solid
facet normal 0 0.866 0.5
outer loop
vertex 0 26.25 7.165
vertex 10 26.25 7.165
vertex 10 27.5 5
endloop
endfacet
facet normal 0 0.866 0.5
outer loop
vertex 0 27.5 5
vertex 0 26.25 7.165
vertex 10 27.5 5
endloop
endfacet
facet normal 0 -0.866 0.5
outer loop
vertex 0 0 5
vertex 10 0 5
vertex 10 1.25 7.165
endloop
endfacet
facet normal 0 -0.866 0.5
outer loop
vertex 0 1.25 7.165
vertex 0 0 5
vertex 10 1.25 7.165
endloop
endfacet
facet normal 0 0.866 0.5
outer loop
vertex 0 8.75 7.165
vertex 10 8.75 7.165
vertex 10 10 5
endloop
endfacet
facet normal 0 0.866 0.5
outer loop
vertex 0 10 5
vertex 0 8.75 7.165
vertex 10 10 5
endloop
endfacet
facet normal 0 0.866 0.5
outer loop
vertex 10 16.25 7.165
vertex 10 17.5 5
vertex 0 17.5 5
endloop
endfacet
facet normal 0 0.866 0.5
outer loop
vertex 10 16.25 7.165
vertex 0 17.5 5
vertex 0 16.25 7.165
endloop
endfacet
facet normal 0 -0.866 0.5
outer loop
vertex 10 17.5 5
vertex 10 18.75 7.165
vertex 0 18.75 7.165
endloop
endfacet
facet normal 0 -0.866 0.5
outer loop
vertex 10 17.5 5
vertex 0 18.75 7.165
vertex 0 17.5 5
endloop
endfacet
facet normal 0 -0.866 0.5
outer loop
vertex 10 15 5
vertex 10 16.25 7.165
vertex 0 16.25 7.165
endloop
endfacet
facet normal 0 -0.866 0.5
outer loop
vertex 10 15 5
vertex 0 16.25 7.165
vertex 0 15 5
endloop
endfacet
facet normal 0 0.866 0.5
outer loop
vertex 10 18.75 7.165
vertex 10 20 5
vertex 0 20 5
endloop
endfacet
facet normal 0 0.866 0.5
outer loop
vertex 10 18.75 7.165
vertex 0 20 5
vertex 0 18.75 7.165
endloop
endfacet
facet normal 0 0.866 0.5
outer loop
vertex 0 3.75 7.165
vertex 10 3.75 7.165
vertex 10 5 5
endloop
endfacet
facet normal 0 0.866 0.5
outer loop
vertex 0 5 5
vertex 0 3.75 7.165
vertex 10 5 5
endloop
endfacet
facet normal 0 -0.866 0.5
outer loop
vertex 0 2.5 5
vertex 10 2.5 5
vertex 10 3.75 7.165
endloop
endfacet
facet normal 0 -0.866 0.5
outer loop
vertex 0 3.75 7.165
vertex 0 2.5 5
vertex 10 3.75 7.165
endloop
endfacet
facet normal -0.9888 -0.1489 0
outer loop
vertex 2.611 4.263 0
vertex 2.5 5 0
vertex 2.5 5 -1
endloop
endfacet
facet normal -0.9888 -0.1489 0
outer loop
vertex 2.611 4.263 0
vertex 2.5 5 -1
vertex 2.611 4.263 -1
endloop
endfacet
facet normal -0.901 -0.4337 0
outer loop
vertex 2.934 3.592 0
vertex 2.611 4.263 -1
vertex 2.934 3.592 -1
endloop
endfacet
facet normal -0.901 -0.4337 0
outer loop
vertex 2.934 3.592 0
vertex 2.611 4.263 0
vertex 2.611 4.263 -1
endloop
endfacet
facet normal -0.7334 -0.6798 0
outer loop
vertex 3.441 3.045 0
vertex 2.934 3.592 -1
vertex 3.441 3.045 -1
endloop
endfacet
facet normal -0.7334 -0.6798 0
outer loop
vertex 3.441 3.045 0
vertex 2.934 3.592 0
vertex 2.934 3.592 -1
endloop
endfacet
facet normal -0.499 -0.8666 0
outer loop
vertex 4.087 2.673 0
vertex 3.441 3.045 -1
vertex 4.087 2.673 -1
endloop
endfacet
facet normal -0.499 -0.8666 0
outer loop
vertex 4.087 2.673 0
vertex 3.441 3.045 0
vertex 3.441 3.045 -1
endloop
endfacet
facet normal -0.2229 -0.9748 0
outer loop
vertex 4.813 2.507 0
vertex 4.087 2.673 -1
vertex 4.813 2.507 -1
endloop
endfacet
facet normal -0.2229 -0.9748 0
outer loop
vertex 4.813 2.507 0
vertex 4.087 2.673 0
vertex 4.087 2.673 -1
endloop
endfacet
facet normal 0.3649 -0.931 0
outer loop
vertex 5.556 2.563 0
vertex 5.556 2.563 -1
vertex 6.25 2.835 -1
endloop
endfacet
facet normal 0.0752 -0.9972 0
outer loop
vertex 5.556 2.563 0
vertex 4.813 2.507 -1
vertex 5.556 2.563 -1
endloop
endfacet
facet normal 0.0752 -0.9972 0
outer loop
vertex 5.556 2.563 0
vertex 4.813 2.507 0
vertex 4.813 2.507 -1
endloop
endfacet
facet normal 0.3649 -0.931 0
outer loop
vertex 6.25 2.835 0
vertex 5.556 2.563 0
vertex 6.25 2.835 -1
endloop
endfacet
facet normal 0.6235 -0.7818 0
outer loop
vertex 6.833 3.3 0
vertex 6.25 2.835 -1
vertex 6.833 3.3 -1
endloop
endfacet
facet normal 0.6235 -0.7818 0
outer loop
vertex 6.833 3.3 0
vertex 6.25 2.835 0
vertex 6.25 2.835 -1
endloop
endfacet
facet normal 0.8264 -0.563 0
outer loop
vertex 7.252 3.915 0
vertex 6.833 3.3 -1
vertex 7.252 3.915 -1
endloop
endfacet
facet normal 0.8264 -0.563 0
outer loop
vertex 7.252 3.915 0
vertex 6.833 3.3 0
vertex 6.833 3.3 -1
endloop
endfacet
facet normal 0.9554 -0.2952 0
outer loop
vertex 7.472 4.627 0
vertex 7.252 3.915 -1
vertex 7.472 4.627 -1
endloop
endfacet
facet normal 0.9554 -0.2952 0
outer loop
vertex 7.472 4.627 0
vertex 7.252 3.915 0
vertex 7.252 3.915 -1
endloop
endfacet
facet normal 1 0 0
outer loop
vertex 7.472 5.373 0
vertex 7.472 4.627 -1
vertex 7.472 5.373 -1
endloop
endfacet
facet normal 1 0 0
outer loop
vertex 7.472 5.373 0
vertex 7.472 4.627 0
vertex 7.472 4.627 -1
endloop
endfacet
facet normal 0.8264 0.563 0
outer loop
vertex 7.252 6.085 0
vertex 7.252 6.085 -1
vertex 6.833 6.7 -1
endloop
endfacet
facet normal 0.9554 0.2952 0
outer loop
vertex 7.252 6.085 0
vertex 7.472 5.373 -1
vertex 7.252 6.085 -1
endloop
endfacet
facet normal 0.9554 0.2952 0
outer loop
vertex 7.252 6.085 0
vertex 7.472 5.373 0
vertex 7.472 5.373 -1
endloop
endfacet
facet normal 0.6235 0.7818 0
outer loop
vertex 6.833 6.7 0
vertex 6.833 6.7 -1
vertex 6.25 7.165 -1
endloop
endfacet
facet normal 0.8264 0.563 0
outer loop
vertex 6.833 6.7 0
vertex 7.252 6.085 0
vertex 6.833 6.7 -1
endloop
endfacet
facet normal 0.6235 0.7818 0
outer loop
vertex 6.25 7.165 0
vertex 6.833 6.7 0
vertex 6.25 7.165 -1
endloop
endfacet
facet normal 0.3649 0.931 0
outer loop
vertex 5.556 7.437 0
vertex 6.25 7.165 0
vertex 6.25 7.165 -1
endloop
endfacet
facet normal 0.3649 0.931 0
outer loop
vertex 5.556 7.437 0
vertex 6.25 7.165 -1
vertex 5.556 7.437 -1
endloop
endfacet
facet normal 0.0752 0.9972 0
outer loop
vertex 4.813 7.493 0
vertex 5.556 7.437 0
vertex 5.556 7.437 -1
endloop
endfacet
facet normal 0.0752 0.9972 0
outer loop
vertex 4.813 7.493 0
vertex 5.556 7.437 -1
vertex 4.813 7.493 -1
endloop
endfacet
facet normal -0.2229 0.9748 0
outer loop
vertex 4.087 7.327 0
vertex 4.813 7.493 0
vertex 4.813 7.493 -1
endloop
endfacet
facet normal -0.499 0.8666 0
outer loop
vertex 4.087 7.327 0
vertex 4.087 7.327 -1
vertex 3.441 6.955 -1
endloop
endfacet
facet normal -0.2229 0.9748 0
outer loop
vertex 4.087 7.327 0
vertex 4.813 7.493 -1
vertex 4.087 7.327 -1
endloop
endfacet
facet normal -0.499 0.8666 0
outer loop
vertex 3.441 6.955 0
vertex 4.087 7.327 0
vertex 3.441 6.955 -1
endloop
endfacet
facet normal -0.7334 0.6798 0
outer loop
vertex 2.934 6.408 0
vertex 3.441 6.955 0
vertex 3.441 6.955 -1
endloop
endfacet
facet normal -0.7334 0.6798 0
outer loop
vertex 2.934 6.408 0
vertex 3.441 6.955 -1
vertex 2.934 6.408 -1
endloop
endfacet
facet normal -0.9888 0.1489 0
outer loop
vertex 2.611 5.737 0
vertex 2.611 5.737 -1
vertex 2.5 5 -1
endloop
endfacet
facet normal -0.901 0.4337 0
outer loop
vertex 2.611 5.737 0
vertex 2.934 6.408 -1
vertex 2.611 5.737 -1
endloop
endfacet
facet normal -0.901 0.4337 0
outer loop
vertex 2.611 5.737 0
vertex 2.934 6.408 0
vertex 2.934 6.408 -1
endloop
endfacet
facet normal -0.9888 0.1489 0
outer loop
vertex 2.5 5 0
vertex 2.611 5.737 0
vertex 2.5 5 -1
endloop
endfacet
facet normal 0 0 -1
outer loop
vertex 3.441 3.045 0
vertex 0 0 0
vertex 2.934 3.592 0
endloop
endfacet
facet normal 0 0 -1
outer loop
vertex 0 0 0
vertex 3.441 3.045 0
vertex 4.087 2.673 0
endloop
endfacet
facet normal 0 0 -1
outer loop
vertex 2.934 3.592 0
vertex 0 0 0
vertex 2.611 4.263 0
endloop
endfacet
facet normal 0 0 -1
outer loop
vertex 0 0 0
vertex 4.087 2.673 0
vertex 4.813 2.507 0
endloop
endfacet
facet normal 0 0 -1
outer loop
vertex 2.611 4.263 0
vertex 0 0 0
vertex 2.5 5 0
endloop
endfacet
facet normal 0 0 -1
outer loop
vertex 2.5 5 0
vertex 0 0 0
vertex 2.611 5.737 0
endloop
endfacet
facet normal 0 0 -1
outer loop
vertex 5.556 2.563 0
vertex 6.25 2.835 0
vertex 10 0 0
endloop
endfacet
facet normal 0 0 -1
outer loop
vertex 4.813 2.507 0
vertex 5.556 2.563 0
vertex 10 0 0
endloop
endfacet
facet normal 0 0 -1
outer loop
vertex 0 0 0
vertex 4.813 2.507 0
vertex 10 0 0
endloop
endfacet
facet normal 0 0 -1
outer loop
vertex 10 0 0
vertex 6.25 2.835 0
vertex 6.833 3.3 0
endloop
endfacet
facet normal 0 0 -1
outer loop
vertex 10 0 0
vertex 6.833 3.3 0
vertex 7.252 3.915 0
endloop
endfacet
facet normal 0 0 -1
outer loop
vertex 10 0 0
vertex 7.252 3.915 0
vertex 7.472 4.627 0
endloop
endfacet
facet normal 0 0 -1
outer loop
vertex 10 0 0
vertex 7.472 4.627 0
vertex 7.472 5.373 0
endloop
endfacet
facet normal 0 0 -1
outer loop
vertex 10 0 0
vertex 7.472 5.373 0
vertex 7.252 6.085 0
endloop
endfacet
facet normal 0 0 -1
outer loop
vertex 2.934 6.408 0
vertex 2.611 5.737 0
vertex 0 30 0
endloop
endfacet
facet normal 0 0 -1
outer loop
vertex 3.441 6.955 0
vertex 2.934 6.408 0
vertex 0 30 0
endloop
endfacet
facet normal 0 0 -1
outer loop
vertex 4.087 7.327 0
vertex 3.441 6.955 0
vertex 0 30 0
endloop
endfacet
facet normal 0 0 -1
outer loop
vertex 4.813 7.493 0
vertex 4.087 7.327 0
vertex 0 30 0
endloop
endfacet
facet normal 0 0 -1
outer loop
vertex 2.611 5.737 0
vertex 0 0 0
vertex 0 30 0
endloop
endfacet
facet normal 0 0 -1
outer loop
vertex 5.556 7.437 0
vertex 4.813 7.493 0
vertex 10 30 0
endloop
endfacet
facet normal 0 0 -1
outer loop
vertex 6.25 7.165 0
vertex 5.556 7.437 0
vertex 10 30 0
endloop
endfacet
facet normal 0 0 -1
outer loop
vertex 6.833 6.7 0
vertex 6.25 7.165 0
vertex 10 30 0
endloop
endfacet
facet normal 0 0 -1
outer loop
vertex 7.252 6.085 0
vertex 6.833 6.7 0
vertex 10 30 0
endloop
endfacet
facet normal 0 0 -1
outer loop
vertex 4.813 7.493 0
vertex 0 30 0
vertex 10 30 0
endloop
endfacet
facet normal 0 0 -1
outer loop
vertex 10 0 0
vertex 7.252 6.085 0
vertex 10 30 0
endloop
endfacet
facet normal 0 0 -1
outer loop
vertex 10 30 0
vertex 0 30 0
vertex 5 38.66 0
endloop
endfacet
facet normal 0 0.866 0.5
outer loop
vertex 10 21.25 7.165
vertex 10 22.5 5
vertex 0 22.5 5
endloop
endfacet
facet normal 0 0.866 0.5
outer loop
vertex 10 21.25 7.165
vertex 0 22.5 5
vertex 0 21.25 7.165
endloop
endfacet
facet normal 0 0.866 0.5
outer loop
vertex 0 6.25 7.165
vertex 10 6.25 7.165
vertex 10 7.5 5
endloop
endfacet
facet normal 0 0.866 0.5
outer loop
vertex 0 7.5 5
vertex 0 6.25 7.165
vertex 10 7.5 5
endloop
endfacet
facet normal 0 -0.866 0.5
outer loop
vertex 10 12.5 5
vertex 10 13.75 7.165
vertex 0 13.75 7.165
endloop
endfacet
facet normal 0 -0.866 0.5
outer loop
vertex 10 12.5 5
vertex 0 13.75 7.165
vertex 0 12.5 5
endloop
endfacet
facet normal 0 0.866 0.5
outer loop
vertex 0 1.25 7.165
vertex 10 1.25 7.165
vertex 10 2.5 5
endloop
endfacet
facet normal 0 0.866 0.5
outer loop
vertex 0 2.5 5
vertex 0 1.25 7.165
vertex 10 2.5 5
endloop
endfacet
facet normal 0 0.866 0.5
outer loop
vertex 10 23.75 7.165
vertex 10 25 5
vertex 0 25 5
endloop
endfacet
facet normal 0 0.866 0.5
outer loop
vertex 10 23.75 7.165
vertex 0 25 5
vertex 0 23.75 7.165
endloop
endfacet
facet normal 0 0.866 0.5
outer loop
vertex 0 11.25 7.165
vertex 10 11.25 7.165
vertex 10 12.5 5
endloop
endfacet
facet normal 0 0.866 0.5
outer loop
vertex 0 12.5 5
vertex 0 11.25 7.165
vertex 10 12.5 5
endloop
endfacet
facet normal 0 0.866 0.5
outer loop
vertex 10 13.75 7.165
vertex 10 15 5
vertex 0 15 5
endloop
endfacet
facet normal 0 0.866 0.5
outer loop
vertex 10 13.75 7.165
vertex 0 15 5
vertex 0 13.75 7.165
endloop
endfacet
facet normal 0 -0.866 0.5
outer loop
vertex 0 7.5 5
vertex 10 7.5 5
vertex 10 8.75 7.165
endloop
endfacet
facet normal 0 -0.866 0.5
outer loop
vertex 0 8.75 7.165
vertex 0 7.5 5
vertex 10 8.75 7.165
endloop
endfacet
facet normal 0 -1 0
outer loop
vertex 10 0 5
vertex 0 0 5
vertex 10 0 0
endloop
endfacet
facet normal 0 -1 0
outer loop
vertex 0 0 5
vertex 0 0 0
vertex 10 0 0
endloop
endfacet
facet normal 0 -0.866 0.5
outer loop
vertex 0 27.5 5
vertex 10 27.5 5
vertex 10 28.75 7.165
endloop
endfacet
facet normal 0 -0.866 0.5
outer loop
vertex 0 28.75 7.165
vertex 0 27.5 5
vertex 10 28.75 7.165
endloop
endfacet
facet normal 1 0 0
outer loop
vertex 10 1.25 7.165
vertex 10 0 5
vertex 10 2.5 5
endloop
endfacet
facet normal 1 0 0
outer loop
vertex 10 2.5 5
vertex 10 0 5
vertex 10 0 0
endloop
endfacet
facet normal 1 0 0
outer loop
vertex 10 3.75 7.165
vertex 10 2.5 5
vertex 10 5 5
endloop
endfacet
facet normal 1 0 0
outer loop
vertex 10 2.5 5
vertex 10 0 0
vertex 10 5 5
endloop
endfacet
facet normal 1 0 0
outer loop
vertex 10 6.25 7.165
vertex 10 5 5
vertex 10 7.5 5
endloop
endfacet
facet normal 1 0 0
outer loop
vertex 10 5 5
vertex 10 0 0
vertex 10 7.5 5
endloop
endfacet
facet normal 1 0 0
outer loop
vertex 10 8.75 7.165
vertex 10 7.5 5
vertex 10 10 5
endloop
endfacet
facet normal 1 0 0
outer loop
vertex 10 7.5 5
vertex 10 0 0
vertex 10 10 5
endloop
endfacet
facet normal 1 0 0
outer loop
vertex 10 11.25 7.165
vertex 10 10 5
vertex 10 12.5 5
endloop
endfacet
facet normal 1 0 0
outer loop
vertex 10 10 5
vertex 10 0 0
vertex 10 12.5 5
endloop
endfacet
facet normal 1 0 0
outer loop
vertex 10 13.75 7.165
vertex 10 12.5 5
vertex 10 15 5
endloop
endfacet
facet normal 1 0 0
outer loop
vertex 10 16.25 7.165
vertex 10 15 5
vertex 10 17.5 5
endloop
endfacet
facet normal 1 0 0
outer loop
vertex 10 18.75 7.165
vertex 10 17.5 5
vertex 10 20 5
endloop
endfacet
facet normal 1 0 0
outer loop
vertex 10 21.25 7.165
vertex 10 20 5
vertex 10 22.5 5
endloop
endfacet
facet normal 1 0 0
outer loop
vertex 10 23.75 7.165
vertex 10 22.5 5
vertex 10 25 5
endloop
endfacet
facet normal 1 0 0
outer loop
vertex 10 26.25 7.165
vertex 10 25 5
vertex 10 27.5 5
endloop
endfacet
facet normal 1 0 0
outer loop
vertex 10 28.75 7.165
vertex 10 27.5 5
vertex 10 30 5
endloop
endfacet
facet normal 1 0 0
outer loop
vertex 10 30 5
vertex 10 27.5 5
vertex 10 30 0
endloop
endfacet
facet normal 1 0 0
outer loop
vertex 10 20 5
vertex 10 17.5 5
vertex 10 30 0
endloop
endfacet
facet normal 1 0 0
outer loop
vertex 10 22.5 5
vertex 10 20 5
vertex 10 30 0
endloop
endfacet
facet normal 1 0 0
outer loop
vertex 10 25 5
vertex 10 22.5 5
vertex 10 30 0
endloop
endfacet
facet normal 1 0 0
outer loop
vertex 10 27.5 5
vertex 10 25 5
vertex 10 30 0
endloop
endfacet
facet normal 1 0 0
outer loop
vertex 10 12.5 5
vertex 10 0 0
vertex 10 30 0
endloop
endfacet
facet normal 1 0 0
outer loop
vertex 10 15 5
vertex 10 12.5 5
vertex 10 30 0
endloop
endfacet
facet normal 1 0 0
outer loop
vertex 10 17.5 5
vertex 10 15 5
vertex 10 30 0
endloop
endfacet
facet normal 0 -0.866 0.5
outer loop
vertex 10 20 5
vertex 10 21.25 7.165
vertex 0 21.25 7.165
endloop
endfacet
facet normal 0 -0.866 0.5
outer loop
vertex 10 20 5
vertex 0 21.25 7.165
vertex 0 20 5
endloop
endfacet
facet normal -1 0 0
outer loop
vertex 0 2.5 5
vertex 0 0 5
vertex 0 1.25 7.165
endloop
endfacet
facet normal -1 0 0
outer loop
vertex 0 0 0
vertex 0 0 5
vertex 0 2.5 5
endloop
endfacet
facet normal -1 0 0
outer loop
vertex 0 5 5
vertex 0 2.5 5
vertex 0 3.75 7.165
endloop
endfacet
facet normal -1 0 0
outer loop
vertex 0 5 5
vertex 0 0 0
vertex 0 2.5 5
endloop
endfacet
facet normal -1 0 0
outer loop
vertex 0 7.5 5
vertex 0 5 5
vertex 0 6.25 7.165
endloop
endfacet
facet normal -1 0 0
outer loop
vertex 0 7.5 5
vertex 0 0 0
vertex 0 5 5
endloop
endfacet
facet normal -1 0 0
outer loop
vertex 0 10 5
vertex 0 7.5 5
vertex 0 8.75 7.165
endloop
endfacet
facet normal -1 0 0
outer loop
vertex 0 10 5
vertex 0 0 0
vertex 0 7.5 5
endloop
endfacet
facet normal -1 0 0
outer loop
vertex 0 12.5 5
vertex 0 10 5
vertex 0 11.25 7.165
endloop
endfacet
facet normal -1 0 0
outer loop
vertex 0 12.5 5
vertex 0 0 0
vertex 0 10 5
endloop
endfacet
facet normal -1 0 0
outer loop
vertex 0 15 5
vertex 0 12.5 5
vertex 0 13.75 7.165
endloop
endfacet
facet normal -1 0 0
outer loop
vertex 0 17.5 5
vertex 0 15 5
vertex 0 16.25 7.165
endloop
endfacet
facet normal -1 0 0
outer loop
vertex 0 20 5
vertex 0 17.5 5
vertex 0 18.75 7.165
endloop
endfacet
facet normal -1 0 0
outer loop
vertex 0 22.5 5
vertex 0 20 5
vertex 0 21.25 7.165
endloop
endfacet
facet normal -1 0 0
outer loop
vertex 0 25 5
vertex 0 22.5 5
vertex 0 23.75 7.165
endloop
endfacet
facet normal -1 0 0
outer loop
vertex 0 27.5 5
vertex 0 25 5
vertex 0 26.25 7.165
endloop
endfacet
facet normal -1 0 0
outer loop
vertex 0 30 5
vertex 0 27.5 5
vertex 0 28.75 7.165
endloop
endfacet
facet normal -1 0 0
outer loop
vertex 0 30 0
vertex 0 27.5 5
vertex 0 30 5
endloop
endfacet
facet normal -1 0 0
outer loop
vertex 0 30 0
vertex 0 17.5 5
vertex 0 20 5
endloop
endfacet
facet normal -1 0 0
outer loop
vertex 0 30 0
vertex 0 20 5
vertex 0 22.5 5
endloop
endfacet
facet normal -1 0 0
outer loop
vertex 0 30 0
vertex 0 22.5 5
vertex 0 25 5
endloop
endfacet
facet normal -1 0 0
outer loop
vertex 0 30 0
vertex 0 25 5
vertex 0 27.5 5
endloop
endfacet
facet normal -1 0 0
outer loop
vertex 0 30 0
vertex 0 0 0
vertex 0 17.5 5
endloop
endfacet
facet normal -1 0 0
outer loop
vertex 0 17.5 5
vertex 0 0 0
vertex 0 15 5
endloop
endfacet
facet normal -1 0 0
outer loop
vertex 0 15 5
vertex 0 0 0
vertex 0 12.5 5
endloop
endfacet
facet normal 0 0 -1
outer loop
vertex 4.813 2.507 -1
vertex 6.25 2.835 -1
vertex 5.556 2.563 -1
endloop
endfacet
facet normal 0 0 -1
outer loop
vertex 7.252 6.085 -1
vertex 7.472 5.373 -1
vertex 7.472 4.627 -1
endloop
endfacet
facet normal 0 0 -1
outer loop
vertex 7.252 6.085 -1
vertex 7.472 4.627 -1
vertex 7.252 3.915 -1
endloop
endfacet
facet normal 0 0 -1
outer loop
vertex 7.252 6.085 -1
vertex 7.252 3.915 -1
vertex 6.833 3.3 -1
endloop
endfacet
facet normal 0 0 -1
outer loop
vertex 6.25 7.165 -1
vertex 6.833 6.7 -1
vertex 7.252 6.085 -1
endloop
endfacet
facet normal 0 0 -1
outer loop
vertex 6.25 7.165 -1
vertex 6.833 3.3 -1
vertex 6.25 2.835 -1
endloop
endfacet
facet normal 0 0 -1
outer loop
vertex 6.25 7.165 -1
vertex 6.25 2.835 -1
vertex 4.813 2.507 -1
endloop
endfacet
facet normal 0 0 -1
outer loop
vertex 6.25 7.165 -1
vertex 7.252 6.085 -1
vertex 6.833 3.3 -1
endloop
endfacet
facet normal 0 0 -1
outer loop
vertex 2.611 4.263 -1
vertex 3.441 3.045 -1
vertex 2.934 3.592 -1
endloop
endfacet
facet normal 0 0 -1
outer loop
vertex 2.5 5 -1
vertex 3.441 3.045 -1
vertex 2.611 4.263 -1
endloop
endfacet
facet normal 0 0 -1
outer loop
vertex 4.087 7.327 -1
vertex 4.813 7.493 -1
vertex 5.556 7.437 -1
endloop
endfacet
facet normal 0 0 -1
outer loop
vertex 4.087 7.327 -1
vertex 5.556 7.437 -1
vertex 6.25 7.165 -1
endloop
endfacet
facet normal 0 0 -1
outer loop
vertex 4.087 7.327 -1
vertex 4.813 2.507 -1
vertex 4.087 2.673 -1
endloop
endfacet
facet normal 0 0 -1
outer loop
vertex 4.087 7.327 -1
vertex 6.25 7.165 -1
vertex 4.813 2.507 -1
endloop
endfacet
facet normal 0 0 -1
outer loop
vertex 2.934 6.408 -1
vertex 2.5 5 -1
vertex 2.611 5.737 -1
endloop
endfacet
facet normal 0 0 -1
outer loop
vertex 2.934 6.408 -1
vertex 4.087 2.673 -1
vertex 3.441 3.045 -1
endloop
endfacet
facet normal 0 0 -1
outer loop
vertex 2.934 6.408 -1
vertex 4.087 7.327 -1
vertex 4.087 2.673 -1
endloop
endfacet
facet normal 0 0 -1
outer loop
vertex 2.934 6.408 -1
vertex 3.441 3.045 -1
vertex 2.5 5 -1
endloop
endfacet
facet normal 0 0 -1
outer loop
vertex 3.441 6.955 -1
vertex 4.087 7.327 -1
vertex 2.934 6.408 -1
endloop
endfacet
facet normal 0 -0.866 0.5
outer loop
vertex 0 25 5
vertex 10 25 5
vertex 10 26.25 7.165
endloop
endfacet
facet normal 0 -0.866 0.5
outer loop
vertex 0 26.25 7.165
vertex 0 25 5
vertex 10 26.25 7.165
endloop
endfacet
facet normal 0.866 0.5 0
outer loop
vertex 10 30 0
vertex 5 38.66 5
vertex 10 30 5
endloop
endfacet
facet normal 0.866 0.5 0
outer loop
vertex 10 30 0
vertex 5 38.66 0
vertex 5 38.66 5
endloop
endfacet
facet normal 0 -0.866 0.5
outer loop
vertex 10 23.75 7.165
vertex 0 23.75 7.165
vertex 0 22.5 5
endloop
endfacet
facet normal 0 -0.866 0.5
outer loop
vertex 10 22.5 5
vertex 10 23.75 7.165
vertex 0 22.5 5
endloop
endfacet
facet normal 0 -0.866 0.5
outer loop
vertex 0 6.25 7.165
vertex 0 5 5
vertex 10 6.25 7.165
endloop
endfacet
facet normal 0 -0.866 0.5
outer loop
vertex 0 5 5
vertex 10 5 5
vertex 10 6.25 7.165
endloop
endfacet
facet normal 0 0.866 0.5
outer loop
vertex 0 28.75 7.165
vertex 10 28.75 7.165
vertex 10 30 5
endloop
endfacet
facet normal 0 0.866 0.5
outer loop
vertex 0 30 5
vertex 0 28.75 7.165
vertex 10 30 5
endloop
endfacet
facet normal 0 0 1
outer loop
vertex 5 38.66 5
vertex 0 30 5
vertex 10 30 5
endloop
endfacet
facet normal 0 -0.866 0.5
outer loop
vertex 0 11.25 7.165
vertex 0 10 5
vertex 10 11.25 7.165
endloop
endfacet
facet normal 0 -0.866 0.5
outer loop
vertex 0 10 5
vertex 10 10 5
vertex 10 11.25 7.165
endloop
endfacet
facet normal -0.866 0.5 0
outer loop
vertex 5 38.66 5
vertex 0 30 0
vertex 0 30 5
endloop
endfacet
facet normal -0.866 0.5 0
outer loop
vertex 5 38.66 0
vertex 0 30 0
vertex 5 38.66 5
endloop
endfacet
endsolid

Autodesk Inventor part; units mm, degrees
ref_plane "YZ Plane" through (0, 0, 0) normal (1, 0, 0) x (0, 1, 0)
ref_plane "XZ Plane" through (0, 0, 0) normal (0, 1, 0) x (-1, 0, 0)
ref_plane "XY Plane" through (0, 0, 0) normal (0, 0, 1) x (1, 0, 0)
sketch "Esboço1" plane through (0, 0, 0) normal (0, 0, 1) x (1, 0, 0)
  line L0 (0, 0) -> (0, 30)
  line L1 (10, 0) -> (10, 30)
  line L2 (0, 0) -> (10, 0)
  line L3 (0, 30) -> (5, 38.6603)
  line L4 (5, 38.6603) -> (10, 30)
  dimension "d0" = 30
  dimension "d3" = 30
  dimension "d4" = 10
extrude "Extrusão1" add sketch "Esboço1" along normal blind 5
sketch "Esboço3" plane through (10, 0, 0) normal (1, 0, 0) x (0, 0, -1)
  line L0 (-5, 30) -> (-5, 0) projected
  line L1 (-5, 0) -> (-2.5, 0) construction
  line L2 (-5, 0) -> (-7.1651, 1.25)
  line L3 (-5, 0) -> (-2.5, 0) construction
  line L4 (-7.1651, 1.25) -> (-5, 2.5)
  line L5 (-5, 2.5) -> (-7.1651, 3.75)
  line L6 (-7.1651, 3.75) -> (-5, 5)
  line L7 (-5, 5) -> (-7.1651, 6.25)
  line L8 (-7.1651, 6.25) -> (-5, 7.5)
  line L9 (-5, 7.5) -> (-7.1651, 8.75)
  line L10 (-7.1651, 8.75) -> (-5, 10)
  line L11 (-5, 10) -> (-7.1651, 11.25)
  line L12 (-5, 10) -> (-2.5, 10) construction
  line L13 (-7.1651, 11.25) -> (-5, 12.5)
  line L14 (-5, 12.5) -> (-12.5939, 12.5) construction
  line L15 (-5, 25) -> (-7.1651, 23.75)
  line L16 (-7.1651, 23.75) -> (-5, 22.5)
  line L17 (-5, 22.5) -> (-7.1651, 21.25)
  line L18 (-7.1651, 21.25) -> (-5, 20)
  line L19 (-5, 20) -> (-7.1651, 18.75)
  line L20 (-7.1651, 18.75) -> (-5, 17.5)
  line L21 (-5, 17.5) -> (-7.1651, 16.25)
  line L22 (-7.1651, 16.25) -> (-5, 15)
  line L23 (-5, 15) -> (-7.1651, 13.75)
  line L24 (-7.1651, 13.75) -> (-5, 12.5)
  line L25 (-5, 25) -> (-7.1651, 26.25)
  line L26 (-7.1651, 26.25) -> (-5, 27.5)
  line L27 (-5, 27.5) -> (-7.1651, 28.75)
  line L28 (-7.1651, 28.75) -> (-5, 30)
  line L29 (-5, 30) -> (-5, 38.6603) projected
  line L30 (-5, 30) -> (-5, 0)
  point P0 (0, 0)
  dimension "d10" = 2.5
  dimension "d11" = 150
  dimension "d12" = 2.5
  dimension "d13" = 2.5
  dimension "d14" = 2.5
  dimension "d15" = 2.5
  dimension "d16" = 150
extrude "Extrusão2" add sketch "Esboço3" against normal blind 10
sketch "Esboço4" plane through (0, 0, 0) normal (0, 0, -1) x (-1, 0, 0)
  circle A0 centre (-5, 5) radius 2.5
  point P0 (0, 0)
  dimension "d19" = 5
extrude "Extrusão3" add sketch "Esboço4" along normal blind 1
properties part number "Prensas coletor"
